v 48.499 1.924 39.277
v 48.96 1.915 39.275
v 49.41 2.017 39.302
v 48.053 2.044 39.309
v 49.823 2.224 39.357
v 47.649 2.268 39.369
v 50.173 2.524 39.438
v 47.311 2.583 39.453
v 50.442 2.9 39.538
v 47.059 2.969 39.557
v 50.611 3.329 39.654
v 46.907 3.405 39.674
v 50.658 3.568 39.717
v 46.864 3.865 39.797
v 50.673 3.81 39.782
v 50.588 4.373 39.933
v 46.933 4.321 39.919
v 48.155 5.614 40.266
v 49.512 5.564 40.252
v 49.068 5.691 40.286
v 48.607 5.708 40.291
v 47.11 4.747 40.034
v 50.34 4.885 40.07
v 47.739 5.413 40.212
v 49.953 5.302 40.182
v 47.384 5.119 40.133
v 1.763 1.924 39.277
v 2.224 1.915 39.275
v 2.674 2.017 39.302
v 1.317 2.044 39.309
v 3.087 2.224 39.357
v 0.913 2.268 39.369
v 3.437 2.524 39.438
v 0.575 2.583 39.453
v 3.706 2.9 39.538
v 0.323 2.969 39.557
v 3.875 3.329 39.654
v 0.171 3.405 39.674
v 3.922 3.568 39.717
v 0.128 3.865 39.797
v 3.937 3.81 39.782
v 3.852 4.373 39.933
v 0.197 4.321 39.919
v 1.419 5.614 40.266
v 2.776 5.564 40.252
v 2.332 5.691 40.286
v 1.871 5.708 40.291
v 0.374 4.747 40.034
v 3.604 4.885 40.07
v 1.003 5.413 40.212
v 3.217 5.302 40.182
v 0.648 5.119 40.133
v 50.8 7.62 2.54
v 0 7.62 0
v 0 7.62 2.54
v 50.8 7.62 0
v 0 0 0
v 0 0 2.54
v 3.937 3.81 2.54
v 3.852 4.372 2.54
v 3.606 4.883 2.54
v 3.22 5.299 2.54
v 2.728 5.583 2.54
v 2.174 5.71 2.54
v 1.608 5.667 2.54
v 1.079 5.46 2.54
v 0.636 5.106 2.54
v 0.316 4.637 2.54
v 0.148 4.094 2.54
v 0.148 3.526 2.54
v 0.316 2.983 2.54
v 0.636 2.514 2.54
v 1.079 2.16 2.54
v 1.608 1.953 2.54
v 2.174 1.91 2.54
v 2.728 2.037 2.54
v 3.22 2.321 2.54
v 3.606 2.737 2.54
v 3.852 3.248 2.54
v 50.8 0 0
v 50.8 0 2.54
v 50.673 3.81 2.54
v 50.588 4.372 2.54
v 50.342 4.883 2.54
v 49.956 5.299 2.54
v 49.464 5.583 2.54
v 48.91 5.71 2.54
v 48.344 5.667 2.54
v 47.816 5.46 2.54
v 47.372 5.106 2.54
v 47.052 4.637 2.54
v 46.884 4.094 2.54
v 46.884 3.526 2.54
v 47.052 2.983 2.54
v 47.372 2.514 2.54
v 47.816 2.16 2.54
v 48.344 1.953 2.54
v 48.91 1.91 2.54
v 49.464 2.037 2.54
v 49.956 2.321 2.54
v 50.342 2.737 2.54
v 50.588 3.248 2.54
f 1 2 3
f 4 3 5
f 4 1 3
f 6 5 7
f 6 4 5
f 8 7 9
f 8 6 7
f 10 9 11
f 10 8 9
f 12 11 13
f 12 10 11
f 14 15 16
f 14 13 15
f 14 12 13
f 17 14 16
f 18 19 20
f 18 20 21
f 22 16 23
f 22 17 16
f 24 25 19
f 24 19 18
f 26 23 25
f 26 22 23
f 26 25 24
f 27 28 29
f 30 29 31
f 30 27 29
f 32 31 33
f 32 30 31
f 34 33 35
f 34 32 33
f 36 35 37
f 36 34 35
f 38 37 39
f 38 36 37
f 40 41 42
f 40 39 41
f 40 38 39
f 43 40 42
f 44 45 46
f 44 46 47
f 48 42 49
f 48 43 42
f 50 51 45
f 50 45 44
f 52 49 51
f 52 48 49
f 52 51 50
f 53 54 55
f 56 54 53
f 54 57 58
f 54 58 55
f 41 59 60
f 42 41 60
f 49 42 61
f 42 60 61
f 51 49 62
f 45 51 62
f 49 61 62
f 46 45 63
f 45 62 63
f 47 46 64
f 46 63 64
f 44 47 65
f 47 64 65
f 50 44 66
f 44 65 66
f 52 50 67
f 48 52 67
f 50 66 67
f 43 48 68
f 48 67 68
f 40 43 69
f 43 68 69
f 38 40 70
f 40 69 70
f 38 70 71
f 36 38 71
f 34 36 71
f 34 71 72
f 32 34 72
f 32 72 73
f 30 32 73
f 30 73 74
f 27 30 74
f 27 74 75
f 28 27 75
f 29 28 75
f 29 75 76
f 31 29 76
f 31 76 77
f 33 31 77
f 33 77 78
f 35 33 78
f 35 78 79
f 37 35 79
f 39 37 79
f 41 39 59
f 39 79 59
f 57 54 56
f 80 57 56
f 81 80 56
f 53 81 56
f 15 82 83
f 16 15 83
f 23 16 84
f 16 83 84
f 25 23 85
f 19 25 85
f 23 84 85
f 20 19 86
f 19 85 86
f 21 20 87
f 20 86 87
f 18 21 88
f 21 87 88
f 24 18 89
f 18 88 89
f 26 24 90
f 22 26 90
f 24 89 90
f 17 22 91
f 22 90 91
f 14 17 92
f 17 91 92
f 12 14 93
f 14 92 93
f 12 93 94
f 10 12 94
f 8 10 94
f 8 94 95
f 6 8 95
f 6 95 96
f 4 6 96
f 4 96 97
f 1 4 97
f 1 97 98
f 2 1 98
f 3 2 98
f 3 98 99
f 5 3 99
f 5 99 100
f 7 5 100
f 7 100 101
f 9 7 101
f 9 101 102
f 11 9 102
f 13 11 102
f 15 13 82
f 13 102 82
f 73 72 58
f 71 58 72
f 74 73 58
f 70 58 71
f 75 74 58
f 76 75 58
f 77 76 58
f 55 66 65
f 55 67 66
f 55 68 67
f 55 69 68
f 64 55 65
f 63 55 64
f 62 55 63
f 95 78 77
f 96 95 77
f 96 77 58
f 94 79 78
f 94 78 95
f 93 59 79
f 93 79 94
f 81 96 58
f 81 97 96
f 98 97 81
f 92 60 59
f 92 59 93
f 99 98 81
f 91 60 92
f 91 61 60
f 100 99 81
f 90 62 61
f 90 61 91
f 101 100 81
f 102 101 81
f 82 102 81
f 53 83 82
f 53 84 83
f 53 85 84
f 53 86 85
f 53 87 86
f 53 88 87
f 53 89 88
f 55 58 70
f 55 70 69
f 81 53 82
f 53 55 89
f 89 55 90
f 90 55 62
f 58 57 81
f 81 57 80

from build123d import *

# Parameters (mm, degrees)
F0_W          = 50.8
F0_H          = 7.62
F1_DEPTH      = 2.54
F2_R          = 1.905
F3_DEPTH      = 38.1
F5_DEPTH      = 50.801
F5_DEPTH_BACK = 94


# Not quite as in the source:
# - an extrude ends at something that could not be found from the text; its depth is read off the source's solid


with BuildPart() as f1:
    # F0 (on Top) → F1 (new body)
    with BuildSketch(Plane.XY):
        with Locations((25.4, 3.81)):
            Rectangle(F0_W, F0_H)
    extrude(amount=F1_DEPTH)

    # F2 (on face) → F3 (join)
    with BuildSketch(Plane.XY.offset(2.54)):
        with Locations((2.032, 3.81)):
            Circle(F2_R)
        with Locations((48.768, 3.81)):
            Circle(F2_R)
    extrude(amount=F3_DEPTH)

    # F4 (on Right) → F5 (cut, two sides)
    with BuildSketch(Plane.YZ) as f5_sk:
        Polygon((0, 40.64), (0, 38.7614695235), (7.5709112298, 40.7900890735), align=None)
    extrude(amount=F5_DEPTH, mode=Mode.SUBTRACT)
    extrude(f5_sk.sketch, amount=-F5_DEPTH_BACK, mode=Mode.SUBTRACT)


solid = f1.part
